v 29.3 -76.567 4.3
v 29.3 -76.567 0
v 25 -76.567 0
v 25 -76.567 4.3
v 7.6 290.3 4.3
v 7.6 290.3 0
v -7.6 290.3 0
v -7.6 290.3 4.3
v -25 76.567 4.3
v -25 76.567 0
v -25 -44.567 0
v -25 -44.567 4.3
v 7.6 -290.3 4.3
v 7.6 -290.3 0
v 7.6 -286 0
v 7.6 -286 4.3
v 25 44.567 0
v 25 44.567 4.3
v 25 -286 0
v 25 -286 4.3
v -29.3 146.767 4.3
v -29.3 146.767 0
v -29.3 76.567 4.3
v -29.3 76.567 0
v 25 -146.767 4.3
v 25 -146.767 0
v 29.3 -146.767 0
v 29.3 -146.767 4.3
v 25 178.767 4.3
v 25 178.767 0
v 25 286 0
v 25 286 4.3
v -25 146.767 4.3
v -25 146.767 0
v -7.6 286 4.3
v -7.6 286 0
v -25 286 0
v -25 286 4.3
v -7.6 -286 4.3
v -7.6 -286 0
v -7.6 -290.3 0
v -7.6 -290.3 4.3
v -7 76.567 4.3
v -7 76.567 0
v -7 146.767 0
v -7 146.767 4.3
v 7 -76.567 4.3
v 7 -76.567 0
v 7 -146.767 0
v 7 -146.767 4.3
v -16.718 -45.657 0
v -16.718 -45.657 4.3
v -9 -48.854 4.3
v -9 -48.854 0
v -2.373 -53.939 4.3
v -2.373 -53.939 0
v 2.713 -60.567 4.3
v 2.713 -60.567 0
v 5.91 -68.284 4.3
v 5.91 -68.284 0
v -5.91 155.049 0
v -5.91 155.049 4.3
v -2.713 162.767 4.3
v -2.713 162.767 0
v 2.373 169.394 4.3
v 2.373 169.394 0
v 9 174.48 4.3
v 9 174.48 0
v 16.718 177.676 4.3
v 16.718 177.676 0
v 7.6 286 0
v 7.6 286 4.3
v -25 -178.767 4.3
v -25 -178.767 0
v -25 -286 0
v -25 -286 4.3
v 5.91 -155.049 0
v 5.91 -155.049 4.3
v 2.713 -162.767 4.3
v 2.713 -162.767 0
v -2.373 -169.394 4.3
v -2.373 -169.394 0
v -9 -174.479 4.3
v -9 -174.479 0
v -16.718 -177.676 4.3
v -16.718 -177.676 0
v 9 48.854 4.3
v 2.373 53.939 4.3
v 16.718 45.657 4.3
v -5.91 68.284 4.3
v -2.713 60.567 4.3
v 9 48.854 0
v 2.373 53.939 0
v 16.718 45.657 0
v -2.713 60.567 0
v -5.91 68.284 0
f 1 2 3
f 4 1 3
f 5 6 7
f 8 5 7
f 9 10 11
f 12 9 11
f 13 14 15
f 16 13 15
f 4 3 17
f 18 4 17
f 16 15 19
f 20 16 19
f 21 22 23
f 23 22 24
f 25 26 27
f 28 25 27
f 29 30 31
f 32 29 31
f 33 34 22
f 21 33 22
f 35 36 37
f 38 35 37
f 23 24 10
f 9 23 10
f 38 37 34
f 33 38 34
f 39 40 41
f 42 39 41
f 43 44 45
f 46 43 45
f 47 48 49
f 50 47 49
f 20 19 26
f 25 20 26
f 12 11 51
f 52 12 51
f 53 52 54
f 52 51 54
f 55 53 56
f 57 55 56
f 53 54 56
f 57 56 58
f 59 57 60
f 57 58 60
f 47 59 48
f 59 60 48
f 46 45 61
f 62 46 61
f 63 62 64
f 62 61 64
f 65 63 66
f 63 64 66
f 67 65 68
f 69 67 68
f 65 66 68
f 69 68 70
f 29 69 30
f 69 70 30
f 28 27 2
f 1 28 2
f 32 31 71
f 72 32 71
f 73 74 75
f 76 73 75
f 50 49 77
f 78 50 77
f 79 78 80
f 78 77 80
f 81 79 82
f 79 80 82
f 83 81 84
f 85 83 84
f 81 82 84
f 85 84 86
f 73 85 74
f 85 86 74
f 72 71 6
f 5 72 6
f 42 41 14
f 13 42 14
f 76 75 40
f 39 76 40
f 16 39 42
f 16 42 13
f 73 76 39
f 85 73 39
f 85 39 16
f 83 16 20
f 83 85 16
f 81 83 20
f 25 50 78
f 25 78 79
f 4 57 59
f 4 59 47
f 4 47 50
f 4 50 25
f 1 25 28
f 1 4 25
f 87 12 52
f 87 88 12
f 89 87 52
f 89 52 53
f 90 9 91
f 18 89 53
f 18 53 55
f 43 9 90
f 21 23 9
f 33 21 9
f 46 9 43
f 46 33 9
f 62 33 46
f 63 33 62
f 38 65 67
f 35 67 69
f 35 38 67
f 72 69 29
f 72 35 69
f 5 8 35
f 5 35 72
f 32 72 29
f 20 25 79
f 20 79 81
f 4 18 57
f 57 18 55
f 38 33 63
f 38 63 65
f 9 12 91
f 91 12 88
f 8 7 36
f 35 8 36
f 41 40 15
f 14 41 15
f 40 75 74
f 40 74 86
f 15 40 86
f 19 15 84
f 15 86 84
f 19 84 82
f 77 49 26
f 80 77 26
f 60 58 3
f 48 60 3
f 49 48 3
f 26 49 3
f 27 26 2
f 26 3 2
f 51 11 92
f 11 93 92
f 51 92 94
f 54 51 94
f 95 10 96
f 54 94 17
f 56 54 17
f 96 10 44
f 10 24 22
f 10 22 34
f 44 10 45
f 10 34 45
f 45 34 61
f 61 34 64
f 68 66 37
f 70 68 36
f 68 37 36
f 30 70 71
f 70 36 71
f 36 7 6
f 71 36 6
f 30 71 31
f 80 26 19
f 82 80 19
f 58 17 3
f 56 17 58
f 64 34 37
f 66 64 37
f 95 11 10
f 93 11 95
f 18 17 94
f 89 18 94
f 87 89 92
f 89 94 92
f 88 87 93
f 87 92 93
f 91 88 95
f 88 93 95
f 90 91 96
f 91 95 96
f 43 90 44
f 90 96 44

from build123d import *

# Parameters (mm, degrees)
BOSS_EXTRUDE1_DEPTH = 4.3


with BuildPart() as part:
    # Sketch2 → Boss-Extrude1 (new body)
    with BuildSketch(Plane.XY):
        with BuildLine():
            Line((-25, -286), (-7.6, -286))
            Line((-7.6, -286), (-7.6, -290.3))
            Line((-7.6, -290.3), (7.6, -290.3))
            Line((7.6, -290.3), (7.6, -286))
            Line((7.6, -286), (25, -286))
            Line((25, -286), (25, -146.7666))
            Line((25, -146.7666), (29.3, -146.7666))
            Line((29.3, -146.7666), (29.3, -76.5666))
            Line((29.3, -76.5666), (25, -76.5666))
            Line((25, -76.5666), (25, 44.5667))
            ThreePointArc((25, 44.5667), (2.372583002, 53.939283002), (-7, 76.5667))
            Line((-7, 76.5667), (-7, 146.7667))
            ThreePointArc((-7, 146.7667), (2.372583002, 169.394116998), (25, 178.7667))
            Line((25, 178.7667), (25, 286))
            Line((25, 286), (7.6, 286))
            Line((7.6, 286), (7.6, 290.3))
            Line((7.6, 290.3), (-7.6, 290.3))
            Line((-7.6, 290.3), (-7.6, 286))
            Line((-7.6, 286), (-25, 286))
            Line((-25, 286), (-25, 146.7667))
            Line((-25, 146.7667), (-29.3, 146.7667))
            Line((-29.3, 146.7667), (-29.3, 76.5667))
            Line((-29.3, 76.5667), (-25, 76.5667))
            Line((-25, 76.5667), (-25, -44.5666))
            ThreePointArc((-25, -44.5666), (-2.372583002, -53.939183002), (7, -76.5666))
            Line((7, -76.5666), (7, -146.7666))
            ThreePointArc((7, -146.7666), (-2.372583002, -169.394016998), (-25, -178.7666))
            Line((-25, -178.7666), (-25, -286))
        make_face()
    extrude(amount=BOSS_EXTRUDE1_DEPTH)


solid = part.part
